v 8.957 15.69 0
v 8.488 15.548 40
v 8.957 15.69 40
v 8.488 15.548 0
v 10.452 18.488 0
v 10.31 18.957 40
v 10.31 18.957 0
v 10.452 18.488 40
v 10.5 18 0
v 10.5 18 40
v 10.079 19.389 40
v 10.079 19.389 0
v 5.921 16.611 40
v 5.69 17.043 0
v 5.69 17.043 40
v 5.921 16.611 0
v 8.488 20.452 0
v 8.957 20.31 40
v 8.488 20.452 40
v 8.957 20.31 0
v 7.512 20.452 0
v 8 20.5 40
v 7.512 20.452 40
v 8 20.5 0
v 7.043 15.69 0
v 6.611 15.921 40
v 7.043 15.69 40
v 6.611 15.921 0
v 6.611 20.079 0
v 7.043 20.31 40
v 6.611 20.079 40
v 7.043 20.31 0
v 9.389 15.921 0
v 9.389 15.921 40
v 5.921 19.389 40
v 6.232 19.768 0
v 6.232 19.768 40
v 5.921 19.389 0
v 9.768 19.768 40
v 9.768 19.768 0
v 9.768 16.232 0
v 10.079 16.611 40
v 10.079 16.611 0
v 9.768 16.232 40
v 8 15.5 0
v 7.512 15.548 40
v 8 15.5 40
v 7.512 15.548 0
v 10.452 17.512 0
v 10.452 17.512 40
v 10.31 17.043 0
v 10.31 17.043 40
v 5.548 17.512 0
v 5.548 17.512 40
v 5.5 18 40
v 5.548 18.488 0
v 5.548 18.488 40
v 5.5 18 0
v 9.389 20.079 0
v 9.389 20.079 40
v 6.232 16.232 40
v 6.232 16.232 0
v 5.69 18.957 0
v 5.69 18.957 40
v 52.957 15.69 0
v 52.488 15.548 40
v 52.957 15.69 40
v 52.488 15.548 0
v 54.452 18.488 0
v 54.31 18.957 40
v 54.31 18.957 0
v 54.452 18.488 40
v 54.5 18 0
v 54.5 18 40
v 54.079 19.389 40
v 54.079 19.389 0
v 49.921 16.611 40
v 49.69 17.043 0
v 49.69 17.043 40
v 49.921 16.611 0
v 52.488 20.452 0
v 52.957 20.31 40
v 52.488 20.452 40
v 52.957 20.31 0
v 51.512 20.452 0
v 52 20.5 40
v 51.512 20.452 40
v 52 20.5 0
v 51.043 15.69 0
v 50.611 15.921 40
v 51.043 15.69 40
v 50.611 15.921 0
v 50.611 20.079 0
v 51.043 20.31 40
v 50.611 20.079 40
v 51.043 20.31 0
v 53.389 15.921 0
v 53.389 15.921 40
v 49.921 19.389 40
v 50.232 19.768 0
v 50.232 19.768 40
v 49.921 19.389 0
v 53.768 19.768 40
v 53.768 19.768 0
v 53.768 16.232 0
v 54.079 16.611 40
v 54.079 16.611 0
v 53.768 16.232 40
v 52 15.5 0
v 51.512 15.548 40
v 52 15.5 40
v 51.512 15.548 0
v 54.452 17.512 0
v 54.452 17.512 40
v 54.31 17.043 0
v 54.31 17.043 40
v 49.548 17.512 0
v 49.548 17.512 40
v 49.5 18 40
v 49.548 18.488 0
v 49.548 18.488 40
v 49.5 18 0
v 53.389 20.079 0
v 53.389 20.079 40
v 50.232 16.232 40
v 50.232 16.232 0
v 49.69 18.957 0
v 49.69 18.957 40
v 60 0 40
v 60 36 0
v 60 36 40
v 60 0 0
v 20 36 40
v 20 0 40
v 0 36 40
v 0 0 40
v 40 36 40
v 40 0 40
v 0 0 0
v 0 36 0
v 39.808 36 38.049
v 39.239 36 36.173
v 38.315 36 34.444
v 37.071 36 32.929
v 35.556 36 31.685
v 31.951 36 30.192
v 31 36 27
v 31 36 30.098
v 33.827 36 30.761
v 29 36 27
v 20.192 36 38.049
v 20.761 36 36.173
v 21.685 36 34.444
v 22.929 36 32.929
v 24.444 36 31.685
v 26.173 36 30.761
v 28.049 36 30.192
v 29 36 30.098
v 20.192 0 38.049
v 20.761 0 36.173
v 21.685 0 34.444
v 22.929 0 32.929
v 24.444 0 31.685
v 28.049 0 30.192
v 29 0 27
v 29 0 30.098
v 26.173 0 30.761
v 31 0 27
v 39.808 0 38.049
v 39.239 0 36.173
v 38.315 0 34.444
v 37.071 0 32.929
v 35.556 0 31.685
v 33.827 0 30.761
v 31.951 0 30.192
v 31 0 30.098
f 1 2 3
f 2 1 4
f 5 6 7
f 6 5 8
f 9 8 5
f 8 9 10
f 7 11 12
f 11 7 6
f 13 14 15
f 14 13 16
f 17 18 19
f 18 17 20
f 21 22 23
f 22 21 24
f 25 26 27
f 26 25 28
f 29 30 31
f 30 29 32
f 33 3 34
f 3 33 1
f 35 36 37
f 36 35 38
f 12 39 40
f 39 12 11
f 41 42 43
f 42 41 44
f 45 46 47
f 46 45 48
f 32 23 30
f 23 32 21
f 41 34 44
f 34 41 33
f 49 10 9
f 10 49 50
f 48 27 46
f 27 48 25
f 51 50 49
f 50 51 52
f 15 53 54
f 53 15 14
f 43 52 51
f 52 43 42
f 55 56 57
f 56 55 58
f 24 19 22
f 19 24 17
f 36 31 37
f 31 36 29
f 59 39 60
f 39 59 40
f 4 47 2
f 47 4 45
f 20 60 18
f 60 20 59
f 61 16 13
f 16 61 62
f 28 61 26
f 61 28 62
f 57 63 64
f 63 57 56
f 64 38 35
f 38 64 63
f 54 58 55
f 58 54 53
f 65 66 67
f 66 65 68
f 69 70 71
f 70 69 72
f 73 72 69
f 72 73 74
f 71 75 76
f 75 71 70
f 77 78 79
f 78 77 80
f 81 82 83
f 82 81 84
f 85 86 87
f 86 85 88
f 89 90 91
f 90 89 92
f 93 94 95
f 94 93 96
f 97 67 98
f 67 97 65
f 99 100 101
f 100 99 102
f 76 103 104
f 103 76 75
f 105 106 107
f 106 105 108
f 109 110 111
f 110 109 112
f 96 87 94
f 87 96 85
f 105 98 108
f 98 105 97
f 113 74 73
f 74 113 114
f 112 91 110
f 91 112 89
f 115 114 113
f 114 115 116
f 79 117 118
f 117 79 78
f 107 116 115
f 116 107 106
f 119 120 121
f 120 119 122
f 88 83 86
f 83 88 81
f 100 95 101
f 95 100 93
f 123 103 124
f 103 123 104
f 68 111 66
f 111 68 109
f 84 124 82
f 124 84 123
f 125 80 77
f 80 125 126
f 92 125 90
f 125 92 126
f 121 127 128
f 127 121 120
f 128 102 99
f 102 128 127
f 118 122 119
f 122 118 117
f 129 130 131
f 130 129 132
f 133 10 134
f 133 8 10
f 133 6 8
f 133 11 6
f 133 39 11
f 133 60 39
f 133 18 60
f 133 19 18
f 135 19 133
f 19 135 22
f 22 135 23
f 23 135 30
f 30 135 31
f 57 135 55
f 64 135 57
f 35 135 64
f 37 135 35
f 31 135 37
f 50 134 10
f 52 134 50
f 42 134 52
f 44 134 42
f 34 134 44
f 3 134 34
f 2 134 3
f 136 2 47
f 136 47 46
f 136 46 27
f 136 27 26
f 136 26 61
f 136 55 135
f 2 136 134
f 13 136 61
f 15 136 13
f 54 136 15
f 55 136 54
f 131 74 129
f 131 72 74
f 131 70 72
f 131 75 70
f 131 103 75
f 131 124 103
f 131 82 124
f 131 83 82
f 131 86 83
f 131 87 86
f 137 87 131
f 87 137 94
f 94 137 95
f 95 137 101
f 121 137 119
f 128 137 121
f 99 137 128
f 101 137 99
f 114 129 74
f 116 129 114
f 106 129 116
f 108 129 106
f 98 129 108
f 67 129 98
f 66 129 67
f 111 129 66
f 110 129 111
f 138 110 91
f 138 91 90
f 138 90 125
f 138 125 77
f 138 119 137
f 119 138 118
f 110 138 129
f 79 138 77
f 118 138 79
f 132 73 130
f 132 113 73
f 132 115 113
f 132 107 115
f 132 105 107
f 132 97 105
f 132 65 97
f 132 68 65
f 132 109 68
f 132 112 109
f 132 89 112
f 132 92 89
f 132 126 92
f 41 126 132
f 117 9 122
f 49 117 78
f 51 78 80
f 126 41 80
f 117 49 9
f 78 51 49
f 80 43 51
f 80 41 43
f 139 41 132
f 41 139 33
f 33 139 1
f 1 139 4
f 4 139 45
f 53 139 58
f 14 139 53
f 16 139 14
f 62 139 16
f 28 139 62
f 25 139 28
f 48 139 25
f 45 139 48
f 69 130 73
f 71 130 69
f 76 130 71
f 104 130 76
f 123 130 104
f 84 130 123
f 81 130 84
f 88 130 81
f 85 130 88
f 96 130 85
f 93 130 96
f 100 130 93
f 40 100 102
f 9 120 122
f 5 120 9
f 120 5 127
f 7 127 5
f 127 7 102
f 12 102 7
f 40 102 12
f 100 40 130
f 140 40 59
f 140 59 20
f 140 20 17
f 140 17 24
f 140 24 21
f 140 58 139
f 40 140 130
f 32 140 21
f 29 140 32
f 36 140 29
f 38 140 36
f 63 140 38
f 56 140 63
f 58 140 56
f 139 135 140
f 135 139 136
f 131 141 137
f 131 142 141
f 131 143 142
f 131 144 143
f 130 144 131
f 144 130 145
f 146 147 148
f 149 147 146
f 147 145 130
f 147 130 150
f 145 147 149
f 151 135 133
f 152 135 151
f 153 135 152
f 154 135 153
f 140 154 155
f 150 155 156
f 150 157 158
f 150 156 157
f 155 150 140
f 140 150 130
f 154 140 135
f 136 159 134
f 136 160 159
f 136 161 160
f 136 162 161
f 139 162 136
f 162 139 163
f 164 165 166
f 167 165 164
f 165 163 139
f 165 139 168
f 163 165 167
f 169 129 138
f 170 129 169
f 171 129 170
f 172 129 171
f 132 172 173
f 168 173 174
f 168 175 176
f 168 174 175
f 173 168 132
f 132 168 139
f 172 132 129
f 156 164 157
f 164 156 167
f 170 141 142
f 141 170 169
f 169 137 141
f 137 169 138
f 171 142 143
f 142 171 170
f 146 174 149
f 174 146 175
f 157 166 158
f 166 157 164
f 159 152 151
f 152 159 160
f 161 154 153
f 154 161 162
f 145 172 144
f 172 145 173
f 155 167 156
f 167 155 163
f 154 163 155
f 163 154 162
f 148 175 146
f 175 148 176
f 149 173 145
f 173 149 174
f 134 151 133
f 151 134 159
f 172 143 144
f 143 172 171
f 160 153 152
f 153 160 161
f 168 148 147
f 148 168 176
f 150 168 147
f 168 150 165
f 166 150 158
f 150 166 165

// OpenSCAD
$fn = 32;

// ----------------------------------------------------------------------
// Saddle clamp: split shaft clamp
// ----------------------------------------------------------------------

// --- parameters (mm) ---
blk_l = 60;               // block length, X
blk_w = 36;               // block width, Y
blk_h = 40;               // block height
clamp_r = 10;             // shaft groove radius
hole_r = 2.5;             // bolt hole radius
hole_m = 8;               // bolt hole margin from the ends
saw_w = 2;                // saw kerf width
fit_tol = 0.1;            // tolerance for press fits, mm
free_tol = 0.3;           // tolerance for clearance fits, mm

saw_depth = clamp_r + 3;  // saw kerf depth

difference() {
  cube([blk_l, blk_w, blk_h]);
  translate([blk_l / 2, -1, blk_h])
    rotate([-90, 0, 0])
      cylinder(h = blk_w + 2, r = clamp_r);
  for (sx = [0, 1])
    translate([sx ? blk_l - hole_m : hole_m, blk_w / 2, -1])
      cylinder(r = hole_r, h = blk_h + 2);
  translate([blk_l / 2 - saw_w / 2, -1, blk_h - saw_depth])
    cube([saw_w, blk_w + 2, saw_depth + 1]);
}
